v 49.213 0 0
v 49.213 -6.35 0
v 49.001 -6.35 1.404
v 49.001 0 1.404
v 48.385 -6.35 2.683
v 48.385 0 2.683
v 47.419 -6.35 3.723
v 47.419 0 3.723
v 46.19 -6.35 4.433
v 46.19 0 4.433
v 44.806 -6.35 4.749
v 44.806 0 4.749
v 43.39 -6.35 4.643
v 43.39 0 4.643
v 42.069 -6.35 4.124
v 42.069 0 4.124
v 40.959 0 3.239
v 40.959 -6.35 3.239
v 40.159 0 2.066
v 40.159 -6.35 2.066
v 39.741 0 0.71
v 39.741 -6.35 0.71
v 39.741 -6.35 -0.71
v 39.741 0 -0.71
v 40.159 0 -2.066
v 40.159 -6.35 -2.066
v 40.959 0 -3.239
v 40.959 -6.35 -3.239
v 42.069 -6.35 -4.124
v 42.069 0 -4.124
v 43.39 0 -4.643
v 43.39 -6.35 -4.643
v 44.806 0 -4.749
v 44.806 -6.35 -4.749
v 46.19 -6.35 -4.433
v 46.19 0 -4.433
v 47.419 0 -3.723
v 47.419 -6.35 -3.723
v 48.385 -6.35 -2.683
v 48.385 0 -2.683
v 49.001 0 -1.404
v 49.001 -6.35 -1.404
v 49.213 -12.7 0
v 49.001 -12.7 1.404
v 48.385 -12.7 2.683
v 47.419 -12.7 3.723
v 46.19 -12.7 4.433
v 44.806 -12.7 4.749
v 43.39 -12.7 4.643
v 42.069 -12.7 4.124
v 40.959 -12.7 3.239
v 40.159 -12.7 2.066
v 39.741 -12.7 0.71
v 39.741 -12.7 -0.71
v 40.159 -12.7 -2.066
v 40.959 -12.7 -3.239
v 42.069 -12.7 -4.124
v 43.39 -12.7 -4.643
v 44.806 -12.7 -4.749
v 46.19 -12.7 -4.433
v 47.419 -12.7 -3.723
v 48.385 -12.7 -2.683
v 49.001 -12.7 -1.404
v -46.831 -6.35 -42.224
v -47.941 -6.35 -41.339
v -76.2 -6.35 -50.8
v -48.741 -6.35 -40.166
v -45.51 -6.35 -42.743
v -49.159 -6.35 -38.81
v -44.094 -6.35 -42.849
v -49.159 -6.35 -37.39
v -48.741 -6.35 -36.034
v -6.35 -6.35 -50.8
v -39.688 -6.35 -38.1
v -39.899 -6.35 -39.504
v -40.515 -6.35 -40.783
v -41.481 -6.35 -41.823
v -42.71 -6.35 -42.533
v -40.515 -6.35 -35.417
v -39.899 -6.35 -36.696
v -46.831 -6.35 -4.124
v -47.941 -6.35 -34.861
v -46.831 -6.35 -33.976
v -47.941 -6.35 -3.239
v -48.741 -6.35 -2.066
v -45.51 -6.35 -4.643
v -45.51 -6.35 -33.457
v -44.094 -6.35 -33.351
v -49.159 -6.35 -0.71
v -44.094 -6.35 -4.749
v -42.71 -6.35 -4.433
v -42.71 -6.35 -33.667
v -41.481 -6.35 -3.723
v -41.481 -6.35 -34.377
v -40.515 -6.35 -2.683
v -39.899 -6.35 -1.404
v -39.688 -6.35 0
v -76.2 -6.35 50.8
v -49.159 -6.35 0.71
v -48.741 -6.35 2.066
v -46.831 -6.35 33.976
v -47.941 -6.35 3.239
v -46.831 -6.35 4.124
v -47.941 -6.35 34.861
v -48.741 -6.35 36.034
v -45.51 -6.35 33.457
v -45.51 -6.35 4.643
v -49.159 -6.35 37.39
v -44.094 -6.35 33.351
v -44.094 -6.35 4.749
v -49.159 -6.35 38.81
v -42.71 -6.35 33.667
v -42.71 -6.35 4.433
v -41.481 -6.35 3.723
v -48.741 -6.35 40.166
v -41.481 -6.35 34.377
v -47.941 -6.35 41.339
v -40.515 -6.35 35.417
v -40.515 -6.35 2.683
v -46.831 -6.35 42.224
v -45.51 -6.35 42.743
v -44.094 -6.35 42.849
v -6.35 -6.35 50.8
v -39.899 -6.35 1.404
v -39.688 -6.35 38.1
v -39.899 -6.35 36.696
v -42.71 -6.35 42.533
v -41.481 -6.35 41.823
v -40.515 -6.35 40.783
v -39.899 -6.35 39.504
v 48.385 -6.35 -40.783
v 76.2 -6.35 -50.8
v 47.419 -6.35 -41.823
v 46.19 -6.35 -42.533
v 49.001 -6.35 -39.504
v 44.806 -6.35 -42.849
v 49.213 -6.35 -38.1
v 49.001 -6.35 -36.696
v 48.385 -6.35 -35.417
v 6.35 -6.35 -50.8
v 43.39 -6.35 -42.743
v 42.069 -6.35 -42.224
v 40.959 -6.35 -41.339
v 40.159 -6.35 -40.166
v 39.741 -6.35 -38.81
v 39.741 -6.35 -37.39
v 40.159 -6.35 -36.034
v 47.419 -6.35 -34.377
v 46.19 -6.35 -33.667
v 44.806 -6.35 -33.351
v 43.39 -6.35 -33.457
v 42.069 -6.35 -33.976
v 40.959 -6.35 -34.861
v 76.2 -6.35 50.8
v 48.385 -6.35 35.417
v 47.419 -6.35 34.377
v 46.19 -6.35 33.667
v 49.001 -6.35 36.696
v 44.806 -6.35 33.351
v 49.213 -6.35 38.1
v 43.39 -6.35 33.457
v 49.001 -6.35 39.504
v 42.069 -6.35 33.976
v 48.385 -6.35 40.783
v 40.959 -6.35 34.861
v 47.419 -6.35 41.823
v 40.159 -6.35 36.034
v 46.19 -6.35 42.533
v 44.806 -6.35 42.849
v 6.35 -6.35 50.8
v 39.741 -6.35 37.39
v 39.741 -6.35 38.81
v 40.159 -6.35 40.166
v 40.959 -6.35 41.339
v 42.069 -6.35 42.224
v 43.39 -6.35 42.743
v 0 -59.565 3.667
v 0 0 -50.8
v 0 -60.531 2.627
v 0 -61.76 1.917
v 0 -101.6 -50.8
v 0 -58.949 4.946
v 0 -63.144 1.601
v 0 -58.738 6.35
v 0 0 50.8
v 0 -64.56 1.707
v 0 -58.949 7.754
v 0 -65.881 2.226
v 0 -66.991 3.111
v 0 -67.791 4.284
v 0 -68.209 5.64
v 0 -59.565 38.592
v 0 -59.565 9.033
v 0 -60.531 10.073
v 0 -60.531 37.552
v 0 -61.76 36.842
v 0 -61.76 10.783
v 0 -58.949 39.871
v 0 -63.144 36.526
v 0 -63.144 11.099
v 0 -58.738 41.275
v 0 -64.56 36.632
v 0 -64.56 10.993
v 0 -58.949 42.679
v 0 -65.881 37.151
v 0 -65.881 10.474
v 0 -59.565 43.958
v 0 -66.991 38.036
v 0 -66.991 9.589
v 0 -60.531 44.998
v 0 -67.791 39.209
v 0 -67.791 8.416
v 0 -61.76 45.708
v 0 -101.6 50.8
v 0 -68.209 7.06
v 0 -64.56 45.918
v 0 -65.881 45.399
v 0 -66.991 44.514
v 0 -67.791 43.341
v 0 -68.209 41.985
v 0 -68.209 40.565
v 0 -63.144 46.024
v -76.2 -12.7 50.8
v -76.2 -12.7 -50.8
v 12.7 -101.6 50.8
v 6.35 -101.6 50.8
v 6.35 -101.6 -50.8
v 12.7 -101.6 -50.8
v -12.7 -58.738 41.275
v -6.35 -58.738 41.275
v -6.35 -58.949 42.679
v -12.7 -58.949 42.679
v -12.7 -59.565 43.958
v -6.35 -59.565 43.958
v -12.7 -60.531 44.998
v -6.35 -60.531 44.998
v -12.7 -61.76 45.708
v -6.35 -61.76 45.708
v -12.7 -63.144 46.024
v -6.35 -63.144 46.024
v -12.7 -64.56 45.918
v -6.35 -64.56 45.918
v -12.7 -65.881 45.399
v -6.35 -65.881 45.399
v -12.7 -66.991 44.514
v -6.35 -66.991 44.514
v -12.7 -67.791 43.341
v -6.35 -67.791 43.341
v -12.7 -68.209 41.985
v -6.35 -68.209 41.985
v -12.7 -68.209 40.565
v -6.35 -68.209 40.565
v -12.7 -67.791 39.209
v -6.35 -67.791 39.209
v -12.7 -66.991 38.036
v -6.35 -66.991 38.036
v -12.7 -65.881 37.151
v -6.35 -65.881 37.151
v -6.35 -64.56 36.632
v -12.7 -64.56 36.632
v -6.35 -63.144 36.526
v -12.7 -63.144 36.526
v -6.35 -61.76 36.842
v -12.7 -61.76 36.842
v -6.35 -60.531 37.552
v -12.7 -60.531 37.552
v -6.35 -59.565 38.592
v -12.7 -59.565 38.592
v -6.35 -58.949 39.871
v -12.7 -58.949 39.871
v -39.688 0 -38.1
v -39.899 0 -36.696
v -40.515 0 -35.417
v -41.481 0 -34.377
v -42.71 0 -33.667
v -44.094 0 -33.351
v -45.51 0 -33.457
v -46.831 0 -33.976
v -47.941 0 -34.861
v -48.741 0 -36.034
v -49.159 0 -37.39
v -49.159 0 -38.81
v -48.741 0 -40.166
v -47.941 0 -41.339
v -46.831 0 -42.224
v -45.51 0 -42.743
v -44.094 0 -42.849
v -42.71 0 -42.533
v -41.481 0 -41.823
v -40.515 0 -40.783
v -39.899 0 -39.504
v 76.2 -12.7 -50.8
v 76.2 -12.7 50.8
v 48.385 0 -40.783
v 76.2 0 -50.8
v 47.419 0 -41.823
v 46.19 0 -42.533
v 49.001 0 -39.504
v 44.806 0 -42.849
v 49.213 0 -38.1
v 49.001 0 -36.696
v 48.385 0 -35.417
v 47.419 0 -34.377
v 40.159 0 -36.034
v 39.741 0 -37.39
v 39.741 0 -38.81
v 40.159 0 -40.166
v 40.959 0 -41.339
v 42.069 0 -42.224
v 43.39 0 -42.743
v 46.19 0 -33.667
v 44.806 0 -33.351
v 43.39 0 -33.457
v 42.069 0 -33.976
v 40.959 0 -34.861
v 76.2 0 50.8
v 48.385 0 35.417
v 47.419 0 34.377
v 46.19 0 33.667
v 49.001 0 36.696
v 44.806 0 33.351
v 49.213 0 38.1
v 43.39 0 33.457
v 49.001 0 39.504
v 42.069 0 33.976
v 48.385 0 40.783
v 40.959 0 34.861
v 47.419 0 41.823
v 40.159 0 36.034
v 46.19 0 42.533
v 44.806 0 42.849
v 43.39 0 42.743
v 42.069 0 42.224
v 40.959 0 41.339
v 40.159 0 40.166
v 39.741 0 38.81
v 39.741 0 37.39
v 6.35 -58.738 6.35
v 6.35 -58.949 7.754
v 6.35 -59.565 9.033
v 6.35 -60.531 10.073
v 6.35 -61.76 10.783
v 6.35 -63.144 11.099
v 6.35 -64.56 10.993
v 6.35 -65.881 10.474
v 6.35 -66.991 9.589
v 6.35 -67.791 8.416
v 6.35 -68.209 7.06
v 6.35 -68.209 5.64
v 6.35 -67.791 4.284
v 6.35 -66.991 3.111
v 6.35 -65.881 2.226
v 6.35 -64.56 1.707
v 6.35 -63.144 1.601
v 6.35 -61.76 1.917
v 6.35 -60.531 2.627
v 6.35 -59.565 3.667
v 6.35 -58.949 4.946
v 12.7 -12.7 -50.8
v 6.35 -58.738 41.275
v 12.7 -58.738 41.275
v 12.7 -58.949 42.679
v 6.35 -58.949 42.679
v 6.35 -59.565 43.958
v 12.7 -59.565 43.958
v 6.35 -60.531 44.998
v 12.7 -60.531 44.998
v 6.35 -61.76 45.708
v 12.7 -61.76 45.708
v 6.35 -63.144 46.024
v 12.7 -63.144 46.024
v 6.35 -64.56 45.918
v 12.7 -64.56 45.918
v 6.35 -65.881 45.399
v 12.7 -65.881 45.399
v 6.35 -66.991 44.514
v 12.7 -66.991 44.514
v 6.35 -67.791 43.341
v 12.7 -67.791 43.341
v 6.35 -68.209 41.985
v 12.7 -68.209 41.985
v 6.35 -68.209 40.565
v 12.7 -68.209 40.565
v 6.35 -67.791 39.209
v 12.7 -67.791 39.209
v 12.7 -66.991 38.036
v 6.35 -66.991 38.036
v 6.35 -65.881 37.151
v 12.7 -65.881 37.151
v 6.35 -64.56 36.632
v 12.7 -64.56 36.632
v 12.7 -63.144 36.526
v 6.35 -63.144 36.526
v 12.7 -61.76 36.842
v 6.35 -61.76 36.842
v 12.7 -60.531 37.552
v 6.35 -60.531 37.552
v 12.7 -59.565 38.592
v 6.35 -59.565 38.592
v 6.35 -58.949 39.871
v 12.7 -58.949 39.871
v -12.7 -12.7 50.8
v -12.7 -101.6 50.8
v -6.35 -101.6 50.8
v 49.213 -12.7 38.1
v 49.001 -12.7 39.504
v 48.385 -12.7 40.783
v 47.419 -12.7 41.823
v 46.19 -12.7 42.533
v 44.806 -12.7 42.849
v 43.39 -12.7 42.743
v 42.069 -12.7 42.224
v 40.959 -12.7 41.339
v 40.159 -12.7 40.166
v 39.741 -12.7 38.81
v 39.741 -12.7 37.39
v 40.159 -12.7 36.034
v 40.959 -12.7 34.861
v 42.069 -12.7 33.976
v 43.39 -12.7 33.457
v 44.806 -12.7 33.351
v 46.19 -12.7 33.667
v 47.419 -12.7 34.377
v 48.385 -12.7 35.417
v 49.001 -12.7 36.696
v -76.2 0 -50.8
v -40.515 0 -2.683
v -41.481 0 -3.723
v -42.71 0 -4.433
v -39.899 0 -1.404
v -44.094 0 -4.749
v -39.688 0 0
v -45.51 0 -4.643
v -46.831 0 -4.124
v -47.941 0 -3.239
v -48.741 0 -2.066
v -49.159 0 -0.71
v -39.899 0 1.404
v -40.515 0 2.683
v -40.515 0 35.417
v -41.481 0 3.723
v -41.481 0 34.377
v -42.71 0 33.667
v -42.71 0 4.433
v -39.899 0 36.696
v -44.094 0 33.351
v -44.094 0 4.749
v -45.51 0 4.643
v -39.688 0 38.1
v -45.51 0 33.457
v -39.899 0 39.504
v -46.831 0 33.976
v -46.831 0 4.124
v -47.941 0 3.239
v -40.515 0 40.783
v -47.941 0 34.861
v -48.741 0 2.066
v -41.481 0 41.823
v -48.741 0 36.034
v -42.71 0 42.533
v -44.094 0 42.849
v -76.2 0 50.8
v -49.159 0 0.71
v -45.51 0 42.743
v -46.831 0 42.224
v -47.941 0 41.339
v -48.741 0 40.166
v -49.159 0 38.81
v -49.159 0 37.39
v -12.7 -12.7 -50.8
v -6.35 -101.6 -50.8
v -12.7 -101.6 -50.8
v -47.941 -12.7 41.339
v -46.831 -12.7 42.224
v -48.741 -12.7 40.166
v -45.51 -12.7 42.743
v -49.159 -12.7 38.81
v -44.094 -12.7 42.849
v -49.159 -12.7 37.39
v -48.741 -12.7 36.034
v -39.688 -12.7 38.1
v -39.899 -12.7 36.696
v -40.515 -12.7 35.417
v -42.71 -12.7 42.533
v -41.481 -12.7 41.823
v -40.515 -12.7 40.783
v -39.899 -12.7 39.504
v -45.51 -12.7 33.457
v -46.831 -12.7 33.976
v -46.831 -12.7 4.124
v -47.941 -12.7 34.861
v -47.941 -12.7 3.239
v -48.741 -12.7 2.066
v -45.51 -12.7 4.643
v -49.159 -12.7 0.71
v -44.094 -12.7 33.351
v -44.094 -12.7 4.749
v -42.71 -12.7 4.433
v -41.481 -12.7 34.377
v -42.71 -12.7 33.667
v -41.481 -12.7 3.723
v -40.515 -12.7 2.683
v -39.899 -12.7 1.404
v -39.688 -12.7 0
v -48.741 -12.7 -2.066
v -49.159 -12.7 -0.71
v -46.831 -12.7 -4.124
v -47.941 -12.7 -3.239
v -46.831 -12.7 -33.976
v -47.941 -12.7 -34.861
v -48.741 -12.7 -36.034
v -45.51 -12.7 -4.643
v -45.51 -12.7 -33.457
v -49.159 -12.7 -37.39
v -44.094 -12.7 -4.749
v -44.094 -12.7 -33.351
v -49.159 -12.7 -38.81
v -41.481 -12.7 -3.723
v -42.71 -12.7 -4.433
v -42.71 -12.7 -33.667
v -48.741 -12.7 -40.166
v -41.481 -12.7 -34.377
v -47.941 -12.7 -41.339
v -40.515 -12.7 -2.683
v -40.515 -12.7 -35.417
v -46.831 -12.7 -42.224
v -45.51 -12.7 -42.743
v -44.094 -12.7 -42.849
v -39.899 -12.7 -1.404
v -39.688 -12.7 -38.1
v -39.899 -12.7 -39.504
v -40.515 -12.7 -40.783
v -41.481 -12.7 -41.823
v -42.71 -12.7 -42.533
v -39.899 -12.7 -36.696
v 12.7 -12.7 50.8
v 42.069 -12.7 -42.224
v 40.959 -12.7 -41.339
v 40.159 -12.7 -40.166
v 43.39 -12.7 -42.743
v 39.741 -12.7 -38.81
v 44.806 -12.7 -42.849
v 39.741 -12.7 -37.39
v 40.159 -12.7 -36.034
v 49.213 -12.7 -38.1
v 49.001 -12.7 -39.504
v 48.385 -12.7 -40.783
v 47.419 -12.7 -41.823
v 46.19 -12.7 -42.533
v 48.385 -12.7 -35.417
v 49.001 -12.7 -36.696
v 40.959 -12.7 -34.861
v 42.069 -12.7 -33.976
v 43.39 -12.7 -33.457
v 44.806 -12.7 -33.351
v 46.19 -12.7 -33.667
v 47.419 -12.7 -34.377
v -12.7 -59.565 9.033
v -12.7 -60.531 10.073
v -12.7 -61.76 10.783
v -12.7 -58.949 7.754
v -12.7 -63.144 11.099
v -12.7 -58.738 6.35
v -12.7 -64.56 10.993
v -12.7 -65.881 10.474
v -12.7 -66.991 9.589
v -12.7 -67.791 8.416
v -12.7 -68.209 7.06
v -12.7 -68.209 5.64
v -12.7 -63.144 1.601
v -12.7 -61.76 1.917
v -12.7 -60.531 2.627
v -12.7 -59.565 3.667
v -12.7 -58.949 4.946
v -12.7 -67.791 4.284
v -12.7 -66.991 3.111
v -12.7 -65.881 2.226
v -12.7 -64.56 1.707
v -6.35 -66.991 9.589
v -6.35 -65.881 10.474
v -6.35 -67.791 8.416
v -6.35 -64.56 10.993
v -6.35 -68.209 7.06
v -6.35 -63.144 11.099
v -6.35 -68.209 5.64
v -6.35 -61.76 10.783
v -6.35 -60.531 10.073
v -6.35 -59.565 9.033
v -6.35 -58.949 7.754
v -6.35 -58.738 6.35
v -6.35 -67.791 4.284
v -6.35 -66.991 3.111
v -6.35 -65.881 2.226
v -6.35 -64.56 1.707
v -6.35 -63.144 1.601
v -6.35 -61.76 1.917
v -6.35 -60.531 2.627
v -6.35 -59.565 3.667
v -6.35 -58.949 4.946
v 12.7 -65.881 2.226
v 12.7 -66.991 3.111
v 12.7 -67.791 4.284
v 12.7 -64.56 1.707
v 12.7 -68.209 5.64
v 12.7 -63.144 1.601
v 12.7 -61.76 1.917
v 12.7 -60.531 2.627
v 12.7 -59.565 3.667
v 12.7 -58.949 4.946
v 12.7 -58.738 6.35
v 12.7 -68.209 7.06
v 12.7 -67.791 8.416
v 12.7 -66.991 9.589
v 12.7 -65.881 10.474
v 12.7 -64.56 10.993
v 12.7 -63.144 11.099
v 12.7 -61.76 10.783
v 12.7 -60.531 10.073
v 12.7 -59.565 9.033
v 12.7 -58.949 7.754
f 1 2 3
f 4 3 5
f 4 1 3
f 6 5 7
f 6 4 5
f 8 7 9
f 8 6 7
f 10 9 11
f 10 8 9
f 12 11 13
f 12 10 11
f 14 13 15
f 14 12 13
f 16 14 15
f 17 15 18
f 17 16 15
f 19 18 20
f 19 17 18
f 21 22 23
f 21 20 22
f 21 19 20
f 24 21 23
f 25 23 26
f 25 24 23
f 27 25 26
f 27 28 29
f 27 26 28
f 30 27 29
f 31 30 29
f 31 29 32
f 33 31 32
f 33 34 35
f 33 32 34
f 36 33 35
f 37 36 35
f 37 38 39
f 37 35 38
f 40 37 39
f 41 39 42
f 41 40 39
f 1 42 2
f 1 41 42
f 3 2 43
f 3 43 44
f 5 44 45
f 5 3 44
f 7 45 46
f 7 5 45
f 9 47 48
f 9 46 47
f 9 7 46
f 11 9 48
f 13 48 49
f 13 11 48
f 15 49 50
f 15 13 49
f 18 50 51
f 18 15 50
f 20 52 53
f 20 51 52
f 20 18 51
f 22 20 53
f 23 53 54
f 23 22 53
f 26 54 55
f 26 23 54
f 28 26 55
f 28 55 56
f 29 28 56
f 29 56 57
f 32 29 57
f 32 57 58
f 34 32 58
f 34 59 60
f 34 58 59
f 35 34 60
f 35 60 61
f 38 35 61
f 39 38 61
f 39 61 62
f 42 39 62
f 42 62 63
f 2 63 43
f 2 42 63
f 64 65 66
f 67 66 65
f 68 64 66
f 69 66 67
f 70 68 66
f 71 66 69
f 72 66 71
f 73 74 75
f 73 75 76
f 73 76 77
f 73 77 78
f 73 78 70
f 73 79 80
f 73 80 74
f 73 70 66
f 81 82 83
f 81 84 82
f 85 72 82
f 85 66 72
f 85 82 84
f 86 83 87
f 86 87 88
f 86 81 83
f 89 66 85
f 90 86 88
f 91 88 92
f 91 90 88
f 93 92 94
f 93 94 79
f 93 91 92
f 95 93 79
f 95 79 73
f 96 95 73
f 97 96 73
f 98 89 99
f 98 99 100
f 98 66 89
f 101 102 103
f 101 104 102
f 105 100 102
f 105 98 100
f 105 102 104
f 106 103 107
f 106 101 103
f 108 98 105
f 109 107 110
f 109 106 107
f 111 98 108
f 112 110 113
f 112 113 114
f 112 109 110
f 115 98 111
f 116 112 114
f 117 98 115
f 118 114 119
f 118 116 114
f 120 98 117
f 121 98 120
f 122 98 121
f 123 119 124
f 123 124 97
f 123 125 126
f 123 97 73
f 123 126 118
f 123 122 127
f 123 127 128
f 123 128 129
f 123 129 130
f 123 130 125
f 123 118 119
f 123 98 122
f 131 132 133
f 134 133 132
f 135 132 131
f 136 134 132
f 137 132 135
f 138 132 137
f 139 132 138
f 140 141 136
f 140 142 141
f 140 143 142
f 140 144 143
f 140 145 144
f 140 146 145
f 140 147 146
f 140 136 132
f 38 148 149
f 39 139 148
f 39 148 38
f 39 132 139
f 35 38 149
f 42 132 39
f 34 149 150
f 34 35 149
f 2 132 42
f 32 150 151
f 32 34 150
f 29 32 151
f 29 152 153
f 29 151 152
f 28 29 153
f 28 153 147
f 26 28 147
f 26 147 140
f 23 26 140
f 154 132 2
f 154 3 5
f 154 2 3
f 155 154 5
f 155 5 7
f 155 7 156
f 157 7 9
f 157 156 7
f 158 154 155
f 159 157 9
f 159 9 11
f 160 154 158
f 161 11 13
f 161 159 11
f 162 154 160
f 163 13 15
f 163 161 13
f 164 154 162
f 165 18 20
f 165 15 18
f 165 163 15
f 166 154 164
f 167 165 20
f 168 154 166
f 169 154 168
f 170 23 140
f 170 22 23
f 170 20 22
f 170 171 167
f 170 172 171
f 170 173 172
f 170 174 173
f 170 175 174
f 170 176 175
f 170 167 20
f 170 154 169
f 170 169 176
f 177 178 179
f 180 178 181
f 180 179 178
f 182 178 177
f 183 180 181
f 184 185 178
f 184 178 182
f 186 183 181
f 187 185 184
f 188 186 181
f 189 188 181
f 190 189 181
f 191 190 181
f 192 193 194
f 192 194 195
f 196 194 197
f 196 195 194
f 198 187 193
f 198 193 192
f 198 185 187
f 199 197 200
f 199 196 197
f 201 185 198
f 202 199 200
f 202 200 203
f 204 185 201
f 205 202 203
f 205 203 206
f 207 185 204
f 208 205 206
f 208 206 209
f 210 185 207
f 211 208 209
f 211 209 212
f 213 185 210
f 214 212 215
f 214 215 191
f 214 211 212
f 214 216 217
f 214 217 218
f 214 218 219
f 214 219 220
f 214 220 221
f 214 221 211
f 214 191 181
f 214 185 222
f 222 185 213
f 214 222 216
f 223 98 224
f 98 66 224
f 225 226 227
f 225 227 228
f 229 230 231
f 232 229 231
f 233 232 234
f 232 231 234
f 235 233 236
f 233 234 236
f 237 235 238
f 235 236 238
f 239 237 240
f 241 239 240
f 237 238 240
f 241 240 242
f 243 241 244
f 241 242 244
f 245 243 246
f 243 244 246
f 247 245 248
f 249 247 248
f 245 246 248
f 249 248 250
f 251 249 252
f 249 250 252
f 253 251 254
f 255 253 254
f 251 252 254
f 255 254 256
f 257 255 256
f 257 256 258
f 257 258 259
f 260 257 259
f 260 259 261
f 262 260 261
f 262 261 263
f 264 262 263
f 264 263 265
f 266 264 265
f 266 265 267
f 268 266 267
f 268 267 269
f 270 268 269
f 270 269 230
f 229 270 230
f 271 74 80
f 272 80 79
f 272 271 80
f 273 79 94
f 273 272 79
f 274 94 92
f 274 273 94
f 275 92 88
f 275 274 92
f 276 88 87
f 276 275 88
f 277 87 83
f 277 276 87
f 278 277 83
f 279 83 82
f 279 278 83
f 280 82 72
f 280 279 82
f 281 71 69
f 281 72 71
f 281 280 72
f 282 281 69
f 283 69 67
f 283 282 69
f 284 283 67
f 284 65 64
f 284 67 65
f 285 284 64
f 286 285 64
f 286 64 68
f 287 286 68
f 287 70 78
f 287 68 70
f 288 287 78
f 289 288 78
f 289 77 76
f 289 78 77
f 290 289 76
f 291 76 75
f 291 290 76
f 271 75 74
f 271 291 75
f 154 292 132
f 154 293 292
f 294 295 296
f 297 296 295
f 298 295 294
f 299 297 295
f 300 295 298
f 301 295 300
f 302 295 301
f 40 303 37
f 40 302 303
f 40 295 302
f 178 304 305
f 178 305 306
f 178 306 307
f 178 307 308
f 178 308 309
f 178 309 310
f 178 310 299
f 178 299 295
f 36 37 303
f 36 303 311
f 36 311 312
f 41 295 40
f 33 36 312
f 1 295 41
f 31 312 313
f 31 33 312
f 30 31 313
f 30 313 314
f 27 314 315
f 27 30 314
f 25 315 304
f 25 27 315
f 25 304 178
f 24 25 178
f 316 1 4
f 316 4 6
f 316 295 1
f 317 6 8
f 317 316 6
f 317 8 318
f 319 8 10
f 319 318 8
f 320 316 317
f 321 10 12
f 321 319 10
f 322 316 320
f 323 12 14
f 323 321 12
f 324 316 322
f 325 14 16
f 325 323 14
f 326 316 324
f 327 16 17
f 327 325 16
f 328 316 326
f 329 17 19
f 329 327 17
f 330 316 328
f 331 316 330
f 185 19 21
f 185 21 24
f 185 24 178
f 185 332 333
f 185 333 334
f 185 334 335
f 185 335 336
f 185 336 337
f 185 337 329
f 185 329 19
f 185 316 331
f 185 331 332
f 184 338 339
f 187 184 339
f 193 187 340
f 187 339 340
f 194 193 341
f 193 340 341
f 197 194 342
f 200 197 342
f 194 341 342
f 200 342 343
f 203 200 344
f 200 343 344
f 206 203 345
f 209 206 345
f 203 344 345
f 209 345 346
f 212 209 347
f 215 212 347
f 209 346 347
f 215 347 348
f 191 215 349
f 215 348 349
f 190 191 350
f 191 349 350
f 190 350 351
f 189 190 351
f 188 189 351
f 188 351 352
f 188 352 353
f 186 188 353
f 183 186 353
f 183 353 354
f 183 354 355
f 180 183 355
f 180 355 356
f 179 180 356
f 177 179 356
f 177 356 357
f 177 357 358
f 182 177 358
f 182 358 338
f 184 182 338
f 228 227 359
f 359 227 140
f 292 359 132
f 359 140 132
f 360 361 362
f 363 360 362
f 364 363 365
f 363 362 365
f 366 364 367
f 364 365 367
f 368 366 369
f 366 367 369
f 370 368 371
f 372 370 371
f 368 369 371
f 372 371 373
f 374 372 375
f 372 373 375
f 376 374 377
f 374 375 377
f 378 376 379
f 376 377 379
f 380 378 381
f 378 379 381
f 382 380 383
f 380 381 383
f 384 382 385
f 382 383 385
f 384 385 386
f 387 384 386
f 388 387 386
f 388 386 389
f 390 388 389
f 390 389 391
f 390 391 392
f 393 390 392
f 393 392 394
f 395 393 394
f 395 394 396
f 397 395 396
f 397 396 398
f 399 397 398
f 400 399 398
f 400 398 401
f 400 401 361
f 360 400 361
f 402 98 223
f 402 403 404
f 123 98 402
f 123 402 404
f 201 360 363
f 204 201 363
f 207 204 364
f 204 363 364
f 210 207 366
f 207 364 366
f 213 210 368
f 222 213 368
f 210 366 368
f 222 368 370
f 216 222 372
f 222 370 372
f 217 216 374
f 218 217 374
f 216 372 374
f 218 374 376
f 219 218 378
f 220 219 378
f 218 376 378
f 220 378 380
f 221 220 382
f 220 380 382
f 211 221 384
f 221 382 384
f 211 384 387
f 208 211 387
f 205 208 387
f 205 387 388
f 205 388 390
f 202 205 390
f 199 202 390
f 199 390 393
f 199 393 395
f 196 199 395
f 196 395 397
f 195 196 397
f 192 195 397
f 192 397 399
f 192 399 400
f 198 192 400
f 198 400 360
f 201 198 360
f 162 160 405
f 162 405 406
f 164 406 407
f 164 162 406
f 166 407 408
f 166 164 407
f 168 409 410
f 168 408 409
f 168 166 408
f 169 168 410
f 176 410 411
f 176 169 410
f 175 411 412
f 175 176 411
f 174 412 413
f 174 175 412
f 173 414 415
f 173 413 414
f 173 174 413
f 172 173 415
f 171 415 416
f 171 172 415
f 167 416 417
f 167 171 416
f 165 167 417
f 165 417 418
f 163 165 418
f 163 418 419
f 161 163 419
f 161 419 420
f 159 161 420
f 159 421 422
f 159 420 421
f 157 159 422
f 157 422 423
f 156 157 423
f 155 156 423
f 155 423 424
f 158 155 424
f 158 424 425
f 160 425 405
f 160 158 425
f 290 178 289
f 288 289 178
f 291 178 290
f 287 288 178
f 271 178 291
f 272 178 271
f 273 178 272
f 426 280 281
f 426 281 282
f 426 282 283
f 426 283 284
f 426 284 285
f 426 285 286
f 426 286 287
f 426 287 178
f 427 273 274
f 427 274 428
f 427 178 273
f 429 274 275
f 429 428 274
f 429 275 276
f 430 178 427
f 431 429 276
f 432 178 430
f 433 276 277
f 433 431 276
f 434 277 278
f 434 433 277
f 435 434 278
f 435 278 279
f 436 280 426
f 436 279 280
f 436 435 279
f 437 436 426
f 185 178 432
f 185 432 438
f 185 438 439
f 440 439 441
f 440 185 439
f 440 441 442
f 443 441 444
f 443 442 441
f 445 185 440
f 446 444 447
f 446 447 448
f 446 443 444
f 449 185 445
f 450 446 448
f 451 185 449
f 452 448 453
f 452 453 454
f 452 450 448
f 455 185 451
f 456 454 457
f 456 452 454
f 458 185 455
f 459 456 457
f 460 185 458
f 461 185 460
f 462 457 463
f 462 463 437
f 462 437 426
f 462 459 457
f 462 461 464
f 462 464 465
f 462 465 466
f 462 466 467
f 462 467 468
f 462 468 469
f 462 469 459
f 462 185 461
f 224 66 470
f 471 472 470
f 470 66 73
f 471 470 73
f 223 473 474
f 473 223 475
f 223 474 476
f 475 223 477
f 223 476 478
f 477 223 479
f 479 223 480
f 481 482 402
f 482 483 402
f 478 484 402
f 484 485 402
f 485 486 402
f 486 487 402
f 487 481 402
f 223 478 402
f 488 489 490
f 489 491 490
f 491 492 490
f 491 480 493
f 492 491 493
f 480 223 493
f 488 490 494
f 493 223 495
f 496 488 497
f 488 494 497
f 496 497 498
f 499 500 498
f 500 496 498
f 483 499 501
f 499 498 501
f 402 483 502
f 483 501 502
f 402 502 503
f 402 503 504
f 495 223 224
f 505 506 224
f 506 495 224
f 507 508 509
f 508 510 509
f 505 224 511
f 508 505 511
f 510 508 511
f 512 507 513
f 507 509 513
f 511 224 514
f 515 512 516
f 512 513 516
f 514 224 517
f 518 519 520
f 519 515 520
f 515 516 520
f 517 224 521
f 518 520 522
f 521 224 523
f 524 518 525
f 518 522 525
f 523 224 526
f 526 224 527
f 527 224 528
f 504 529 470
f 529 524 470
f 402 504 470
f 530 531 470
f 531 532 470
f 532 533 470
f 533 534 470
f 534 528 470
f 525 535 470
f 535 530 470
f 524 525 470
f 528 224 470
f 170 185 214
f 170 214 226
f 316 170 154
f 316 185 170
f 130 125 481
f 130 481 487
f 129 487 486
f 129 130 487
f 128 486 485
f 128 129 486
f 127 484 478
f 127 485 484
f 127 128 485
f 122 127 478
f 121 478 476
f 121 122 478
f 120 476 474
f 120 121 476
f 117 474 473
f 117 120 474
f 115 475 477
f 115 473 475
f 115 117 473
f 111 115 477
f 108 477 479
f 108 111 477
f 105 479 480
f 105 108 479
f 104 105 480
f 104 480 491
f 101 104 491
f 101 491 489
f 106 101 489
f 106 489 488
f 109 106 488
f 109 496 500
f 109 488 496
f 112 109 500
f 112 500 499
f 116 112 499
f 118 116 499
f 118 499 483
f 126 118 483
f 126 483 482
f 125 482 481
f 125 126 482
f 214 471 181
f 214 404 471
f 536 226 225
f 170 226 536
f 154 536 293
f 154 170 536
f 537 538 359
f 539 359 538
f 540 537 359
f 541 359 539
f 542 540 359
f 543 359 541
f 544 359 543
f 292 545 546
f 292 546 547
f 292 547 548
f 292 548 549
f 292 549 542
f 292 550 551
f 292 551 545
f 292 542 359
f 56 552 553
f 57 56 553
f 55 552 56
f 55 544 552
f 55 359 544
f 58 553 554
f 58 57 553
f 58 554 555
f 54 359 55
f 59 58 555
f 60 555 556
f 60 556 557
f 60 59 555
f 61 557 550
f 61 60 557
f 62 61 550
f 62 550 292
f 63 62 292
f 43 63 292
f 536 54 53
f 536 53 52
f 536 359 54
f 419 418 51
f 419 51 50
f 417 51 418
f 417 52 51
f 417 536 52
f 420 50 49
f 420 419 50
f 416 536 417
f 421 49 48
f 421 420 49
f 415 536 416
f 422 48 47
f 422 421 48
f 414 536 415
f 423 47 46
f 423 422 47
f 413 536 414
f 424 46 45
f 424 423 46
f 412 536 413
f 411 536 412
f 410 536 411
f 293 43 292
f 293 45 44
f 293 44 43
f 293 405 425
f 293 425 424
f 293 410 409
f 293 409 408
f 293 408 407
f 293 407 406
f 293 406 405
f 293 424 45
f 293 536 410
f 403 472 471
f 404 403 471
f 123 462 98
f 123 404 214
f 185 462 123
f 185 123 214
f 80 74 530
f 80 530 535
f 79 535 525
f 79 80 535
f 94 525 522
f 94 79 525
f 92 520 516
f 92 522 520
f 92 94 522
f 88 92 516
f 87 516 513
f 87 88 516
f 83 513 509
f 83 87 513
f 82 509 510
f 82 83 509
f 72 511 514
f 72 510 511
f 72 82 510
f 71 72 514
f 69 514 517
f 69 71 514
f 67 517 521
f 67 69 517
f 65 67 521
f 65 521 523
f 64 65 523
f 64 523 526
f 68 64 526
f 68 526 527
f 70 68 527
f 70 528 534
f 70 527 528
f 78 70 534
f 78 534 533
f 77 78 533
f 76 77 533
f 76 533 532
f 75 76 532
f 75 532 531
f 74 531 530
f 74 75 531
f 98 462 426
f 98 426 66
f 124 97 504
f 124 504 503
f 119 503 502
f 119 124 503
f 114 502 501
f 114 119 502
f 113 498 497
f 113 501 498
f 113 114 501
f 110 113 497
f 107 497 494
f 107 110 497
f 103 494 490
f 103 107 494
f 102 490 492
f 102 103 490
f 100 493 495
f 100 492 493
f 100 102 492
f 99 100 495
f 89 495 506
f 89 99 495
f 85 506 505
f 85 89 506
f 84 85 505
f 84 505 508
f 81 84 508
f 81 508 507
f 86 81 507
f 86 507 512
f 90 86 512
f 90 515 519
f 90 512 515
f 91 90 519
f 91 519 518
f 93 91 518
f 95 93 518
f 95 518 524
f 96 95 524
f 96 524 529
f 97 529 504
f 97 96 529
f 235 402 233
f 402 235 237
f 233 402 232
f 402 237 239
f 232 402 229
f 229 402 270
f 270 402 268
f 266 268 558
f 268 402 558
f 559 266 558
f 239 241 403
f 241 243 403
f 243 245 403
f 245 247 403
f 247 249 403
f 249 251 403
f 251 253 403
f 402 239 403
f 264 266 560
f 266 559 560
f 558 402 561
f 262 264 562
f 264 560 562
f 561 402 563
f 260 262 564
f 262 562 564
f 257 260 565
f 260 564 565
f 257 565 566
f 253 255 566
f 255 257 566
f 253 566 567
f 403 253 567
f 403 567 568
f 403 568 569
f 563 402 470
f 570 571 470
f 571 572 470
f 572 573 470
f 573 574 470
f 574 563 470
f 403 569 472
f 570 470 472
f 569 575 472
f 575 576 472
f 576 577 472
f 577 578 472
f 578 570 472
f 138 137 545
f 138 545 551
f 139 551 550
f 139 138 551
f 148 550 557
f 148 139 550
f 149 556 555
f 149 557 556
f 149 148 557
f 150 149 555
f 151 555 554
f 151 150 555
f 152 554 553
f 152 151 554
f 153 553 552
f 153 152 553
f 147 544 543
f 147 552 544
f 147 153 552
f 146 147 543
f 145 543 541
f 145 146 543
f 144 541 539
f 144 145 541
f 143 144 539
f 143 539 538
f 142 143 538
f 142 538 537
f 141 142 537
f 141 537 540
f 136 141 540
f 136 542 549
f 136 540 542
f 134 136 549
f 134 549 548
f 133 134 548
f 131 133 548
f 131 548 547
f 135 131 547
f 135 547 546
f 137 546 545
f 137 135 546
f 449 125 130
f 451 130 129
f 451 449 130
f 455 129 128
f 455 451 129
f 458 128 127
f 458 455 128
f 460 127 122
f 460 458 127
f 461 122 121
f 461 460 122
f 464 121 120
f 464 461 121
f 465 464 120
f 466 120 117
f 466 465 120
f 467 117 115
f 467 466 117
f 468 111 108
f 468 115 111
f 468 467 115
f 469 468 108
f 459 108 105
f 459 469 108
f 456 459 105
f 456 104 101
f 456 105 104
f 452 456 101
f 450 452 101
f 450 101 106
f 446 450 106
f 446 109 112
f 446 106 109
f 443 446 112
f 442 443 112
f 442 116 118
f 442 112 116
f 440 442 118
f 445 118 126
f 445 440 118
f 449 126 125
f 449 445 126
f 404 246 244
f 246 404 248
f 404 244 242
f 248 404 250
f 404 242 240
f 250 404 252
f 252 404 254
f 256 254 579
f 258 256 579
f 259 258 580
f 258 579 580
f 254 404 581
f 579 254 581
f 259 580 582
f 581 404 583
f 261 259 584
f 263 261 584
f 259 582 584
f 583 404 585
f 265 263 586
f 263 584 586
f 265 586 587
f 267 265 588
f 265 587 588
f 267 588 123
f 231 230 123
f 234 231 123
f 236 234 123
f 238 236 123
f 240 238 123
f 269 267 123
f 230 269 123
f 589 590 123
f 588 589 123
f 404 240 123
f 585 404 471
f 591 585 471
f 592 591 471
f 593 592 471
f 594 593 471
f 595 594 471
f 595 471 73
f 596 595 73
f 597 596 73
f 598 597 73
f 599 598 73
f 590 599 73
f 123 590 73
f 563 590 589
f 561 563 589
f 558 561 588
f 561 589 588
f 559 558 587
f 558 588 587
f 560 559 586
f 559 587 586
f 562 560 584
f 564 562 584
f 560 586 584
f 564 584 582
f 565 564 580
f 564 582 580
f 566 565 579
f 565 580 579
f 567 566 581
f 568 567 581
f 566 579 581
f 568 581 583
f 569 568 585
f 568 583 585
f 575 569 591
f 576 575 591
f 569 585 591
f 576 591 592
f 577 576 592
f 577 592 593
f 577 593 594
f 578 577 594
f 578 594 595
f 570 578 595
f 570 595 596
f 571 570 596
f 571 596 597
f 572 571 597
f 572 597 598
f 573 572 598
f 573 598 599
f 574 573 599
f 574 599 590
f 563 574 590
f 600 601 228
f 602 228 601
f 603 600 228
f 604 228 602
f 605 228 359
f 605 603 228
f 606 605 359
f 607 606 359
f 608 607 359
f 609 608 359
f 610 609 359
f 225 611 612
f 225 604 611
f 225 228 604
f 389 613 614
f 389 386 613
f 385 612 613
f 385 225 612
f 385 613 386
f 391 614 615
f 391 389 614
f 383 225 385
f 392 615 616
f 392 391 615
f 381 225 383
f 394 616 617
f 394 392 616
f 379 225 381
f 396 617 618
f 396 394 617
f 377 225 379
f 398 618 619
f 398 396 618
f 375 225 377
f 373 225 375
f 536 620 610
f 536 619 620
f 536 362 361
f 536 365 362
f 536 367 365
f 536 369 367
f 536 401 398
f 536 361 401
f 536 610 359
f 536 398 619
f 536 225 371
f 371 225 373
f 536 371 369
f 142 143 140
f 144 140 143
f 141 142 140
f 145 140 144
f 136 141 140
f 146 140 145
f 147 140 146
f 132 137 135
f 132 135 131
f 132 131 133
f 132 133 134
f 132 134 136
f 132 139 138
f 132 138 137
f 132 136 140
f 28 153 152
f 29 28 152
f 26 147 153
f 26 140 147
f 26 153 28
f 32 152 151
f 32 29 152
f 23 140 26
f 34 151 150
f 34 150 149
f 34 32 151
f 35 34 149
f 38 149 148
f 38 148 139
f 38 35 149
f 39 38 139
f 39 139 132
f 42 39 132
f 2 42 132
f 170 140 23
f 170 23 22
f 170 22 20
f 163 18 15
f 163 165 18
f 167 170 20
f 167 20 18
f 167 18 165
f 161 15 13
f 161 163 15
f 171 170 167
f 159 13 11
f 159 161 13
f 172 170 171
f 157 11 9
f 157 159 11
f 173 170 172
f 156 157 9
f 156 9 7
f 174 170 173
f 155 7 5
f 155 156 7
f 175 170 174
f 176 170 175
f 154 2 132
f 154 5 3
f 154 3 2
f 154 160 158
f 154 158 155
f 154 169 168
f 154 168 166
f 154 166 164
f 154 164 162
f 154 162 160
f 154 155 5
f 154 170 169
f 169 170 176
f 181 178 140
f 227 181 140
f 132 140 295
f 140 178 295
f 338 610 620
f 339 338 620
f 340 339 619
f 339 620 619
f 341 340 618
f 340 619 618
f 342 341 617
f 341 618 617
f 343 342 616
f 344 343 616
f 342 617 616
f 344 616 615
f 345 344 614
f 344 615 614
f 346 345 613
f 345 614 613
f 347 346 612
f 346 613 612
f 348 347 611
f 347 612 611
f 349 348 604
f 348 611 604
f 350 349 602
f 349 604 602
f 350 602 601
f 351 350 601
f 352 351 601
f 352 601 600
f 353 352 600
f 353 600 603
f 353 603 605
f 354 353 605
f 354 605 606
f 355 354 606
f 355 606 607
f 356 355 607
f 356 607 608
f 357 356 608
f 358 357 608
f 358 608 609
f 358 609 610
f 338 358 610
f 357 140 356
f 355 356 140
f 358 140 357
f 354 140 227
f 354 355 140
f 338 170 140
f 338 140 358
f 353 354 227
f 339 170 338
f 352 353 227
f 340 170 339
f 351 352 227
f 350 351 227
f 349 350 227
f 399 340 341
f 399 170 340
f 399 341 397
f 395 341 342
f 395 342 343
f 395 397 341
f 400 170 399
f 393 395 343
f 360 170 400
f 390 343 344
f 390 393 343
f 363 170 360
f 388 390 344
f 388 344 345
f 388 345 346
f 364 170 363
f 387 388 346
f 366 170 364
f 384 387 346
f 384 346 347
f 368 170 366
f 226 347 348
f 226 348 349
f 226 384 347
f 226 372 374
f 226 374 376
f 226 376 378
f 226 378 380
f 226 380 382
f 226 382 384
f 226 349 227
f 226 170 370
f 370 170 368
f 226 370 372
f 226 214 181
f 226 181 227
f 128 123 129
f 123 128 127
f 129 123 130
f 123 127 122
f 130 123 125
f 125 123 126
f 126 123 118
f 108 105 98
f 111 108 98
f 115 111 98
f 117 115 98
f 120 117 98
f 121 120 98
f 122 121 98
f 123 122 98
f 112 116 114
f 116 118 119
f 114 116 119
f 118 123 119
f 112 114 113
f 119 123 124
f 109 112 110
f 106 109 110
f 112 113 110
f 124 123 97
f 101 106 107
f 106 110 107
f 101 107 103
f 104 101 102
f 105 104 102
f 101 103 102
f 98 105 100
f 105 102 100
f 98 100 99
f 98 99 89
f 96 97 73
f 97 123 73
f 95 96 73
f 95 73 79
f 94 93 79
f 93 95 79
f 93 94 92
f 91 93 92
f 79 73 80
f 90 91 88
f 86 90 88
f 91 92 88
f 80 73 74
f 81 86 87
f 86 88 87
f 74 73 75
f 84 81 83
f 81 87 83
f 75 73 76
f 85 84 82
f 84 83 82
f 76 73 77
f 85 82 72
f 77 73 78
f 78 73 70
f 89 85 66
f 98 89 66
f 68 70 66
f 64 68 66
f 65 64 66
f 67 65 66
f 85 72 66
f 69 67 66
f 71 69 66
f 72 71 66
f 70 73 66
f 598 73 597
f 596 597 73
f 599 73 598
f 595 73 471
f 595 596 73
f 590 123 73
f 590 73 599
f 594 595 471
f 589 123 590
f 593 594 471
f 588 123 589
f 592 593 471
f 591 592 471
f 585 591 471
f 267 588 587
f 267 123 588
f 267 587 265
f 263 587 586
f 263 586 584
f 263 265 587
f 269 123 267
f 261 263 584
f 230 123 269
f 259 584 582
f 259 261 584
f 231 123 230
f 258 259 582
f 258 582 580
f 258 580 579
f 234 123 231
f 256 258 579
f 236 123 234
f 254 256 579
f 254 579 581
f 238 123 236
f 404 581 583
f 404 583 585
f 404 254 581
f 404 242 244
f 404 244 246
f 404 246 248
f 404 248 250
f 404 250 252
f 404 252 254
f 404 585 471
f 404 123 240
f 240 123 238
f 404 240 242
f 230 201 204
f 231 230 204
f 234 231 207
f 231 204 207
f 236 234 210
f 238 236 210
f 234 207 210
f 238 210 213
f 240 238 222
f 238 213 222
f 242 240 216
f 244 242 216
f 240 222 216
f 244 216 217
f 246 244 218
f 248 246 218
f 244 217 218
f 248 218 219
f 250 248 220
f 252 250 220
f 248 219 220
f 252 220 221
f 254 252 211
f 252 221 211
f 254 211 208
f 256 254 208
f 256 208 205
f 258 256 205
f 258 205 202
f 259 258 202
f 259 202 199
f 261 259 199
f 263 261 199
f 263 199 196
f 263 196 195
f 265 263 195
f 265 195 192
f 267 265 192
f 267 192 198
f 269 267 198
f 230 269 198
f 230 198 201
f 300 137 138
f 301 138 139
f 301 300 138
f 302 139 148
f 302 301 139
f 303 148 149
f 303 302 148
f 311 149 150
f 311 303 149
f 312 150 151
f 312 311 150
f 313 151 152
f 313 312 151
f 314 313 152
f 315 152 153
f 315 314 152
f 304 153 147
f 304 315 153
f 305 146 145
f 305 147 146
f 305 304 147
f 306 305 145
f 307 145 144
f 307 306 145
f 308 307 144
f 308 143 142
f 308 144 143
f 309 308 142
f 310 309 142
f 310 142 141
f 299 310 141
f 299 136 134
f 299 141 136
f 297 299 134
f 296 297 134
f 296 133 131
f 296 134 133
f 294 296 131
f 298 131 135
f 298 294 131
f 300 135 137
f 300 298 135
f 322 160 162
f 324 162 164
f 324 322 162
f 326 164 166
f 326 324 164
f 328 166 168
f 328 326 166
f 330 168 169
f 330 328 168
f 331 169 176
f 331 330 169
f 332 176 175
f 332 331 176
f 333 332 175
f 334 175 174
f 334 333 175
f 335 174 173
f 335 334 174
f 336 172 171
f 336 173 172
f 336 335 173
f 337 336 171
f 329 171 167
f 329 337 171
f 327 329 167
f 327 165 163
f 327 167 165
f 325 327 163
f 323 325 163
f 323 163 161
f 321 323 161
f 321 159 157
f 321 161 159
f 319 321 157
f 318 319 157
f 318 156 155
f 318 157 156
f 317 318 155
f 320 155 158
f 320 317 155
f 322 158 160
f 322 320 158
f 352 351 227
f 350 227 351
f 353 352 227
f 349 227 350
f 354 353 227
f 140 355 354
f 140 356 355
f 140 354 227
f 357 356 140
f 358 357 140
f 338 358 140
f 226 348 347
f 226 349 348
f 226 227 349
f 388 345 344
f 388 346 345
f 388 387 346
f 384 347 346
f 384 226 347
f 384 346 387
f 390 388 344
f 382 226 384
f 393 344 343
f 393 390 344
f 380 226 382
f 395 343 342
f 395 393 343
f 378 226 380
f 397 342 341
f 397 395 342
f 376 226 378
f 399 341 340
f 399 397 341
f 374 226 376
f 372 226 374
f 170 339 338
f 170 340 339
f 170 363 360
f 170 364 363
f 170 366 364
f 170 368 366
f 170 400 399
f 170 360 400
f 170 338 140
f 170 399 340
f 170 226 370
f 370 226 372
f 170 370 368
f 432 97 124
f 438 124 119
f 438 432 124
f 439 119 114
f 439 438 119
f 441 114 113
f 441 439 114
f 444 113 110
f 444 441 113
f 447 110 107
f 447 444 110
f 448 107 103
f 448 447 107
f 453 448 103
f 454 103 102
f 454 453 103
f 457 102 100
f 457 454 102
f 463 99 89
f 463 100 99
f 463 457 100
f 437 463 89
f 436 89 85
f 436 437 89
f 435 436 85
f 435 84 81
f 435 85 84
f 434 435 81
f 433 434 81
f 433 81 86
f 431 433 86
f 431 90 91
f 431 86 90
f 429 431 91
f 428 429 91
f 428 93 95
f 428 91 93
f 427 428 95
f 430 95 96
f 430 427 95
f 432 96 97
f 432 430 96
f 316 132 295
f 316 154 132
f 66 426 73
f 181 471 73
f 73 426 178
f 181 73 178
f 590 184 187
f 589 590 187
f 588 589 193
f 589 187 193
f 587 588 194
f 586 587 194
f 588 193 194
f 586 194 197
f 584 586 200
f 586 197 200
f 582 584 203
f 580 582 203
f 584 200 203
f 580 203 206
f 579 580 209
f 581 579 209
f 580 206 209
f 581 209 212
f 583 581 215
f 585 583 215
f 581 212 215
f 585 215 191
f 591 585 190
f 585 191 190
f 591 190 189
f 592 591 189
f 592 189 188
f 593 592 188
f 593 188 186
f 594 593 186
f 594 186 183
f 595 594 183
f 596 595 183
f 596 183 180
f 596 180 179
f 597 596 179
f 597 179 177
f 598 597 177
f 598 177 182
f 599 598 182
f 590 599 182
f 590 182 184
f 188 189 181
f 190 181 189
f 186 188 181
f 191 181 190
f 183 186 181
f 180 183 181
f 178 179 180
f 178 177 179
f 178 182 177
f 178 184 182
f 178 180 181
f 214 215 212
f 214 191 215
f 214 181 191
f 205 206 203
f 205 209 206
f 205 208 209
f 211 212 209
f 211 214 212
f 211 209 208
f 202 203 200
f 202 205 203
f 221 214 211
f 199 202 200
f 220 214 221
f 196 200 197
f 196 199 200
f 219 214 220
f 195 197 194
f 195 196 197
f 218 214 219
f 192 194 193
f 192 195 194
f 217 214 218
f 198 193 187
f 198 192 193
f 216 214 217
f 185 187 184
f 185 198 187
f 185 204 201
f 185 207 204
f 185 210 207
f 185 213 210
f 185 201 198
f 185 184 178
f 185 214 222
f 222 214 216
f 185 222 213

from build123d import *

# Parameters (mm, degrees)
F1_DEPTH = 50.8
F3_DEPTH = 50.8
F5_DEPTH = 50.8
F6_R     = 4.7625
F7_DEPTH = 101.601
F8_R     = 4.7625
F9_DEPTH = 88.901


with BuildPart() as f1:
    # F0 (on Top) → F1 (new body, symmetric)
    with BuildSketch(Plane.XY):
        Polygon((76.2, 0), (0, 0), (0, -101.6), (6.35, -101.6), (6.35, -6.35), (76.2, -6.35), align=None)
    extrude(amount=F1_DEPTH, both=True)


with BuildPart() as f3:
    # F2 (on Top) → F3 (new body, symmetric)
    with BuildSketch(Plane.XY):
        Polygon((0, -101.6), (0, 0), (-76.2, 0), (-76.2, -6.35), (-6.35, -6.35), (-6.35, -101.6), align=None)
    extrude(amount=F3_DEPTH, both=True)


with BuildPart() as f5:
    # F4 (on Top) → F5 (new body, symmetric)
    with BuildSketch(Plane.XY):
        Polygon((-6.35, -101.6), (-6.35, -6.35), (-76.2, -6.35), (-76.2, -12.7), (-12.7, -12.7), (-12.7, -101.6), align=None)
        Polygon((6.35, -6.35), (6.35, -101.6), (12.7, -101.6), (12.7, -12.7), (76.2, -12.7), (76.2, -6.35), align=None)
    extrude(amount=F5_DEPTH, both=True)


with BuildPart() as f7_tool:
    # F6 (on Front) → F7 (new body, through all)
    with BuildSketch(Plane.XZ):
        with Locations((44.45, 38.1)):
            Circle(F6_R)
        with Locations((44.45, 0)):
            Circle(F6_R)
        with Locations((44.45, -38.1)):
            Circle(F6_R)
        with Locations((-44.45, 38.1)):
            Circle(F6_R)
        with Locations((-44.45, 0)):
            Circle(F6_R)
        with Locations((-44.45, -38.1)):
            Circle(F6_R)
    extrude(amount=F7_DEPTH)


with BuildPart() as f1_1:
    add(f1.part)

    # F7: cut by f7_tool
    add(f7_tool.part, mode=Mode.SUBTRACT)


with BuildPart() as f3_1:
    add(f3.part)

    # F7: cut by f7_tool
    add(f7_tool.part, mode=Mode.SUBTRACT)


with BuildPart() as f5_1:
    add(f5.part)

    # F7: cut by f7_tool
    add(f7_tool.part, mode=Mode.SUBTRACT)


with BuildPart() as f9_tool:
    # F8 (on face) → F9 (new body, through all)
    with BuildSketch(Plane.YZ.offset(12.7)):
        with Locations((-63.5, 41.275)):
            Circle(F8_R)
        with Locations((-63.5, 6.35)):
            Circle(F8_R)
    extrude(amount=-F9_DEPTH)


with BuildPart() as f1_2:
    add(f1_1.part)

    # F9: cut by f9_tool
    add(f9_tool.part, mode=Mode.SUBTRACT)


with BuildPart() as f3_2:
    add(f3_1.part)

    # F9: cut by f9_tool
    add(f9_tool.part, mode=Mode.SUBTRACT)


with BuildPart() as f5_2:
    add(f5_1.part)

    # F9: cut by f9_tool
    add(f9_tool.part, mode=Mode.SUBTRACT)


solid = Compound([f1_2.part, f3_2.part, f5_2.part])
